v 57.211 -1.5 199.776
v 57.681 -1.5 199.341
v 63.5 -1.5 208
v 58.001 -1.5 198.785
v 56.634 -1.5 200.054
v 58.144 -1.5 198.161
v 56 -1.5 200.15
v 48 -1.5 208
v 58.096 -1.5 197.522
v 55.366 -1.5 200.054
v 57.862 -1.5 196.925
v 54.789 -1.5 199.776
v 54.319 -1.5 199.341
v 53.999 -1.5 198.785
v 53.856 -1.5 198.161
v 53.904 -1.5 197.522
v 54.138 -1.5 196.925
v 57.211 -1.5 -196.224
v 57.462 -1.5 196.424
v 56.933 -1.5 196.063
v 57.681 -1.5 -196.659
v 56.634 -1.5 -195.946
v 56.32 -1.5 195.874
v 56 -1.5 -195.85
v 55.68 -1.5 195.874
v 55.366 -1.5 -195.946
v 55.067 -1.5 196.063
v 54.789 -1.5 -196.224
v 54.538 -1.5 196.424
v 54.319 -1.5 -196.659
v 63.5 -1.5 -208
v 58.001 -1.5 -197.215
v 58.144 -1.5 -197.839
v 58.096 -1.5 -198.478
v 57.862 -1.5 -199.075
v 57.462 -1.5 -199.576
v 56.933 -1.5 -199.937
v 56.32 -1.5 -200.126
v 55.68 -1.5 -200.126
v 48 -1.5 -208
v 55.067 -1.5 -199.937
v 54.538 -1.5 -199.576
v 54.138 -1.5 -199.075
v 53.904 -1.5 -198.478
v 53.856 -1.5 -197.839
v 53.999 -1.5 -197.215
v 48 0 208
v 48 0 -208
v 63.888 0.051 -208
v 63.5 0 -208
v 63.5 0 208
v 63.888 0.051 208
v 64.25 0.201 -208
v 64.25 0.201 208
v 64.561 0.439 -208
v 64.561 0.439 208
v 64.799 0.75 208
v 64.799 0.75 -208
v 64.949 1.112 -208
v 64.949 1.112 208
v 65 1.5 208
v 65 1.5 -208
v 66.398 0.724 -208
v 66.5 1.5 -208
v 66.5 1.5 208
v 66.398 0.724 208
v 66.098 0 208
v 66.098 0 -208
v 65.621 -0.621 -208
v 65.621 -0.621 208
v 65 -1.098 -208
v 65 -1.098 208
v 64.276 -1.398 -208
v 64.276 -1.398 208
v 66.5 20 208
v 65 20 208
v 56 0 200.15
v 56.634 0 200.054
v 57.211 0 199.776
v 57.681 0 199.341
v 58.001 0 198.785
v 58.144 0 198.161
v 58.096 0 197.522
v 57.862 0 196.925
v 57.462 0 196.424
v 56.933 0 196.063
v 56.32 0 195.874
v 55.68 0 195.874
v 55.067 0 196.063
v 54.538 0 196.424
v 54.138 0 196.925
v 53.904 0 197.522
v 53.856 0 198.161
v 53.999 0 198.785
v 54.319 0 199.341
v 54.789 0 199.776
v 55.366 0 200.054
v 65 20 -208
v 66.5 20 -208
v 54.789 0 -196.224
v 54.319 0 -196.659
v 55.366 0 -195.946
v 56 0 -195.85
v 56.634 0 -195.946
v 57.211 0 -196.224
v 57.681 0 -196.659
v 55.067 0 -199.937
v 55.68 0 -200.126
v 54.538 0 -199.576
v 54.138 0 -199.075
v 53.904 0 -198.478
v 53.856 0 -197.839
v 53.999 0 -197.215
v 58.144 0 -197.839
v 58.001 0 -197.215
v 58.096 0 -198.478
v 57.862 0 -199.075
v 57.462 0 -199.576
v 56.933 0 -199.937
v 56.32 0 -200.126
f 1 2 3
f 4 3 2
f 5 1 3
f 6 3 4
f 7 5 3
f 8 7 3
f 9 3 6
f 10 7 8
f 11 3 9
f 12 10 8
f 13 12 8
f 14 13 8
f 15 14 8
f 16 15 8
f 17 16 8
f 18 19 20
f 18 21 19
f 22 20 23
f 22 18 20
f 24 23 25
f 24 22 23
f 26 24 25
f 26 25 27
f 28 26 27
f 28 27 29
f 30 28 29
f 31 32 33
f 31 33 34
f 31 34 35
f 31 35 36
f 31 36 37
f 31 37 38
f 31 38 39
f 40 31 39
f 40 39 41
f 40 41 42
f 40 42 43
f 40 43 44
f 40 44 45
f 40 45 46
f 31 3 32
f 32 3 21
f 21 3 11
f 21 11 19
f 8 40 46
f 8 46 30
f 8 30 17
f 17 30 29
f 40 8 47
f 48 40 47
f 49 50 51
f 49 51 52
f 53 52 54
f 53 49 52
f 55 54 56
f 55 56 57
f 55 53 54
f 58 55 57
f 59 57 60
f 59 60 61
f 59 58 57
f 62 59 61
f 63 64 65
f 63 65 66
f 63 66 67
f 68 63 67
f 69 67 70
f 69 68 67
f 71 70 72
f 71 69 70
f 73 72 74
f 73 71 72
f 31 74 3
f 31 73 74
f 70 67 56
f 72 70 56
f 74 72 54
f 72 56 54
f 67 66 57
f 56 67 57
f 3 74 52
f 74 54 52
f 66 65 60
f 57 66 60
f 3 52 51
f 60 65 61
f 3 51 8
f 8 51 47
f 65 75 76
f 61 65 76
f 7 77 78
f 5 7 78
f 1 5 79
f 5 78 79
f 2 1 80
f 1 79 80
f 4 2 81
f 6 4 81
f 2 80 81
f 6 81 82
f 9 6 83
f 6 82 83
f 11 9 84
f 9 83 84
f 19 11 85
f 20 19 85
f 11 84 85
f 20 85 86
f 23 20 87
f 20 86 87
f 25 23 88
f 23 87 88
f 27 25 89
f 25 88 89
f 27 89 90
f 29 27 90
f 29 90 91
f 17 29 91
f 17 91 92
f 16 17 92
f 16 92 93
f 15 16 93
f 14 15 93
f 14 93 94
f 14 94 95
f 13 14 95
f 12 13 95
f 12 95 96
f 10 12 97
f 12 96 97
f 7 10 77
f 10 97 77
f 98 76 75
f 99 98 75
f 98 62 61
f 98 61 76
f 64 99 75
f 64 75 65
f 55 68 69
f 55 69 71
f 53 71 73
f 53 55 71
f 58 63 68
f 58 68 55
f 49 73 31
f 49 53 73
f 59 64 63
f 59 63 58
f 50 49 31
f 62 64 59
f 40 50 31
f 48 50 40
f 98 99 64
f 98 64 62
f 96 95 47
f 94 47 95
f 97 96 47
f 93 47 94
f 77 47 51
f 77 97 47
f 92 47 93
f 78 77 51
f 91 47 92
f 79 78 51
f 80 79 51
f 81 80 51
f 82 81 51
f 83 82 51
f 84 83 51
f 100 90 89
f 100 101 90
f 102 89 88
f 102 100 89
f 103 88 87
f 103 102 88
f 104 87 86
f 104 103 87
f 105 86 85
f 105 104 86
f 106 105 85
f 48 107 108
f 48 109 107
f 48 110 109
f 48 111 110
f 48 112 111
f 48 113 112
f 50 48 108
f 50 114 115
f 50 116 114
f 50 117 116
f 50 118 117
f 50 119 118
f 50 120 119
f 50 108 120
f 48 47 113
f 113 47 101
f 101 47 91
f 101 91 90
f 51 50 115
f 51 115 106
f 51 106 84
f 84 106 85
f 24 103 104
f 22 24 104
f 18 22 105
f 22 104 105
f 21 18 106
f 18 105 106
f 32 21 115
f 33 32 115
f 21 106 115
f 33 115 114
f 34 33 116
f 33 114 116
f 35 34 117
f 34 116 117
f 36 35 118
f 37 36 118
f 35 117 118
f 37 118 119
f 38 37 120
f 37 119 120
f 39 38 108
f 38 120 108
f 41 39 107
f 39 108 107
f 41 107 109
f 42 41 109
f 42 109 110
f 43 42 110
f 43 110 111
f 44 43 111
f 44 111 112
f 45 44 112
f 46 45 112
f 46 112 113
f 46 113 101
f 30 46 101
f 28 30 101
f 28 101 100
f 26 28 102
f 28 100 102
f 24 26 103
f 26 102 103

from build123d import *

# Parameters (mm, degrees)
SM_GUIDE_DEPTH  = 416
SK_HOLES_R      = 2.15
CUT_HOLES_DEPTH = 1.5


# Sheet-metal steps are written as plain solids
with BuildPart() as part:
    # SK_Guide → SM_Guide (new body)
    with BuildSketch(Plane.XY.offset(-208)):
        with BuildLine():
            Line((48, 0), (63.5, 0))
            ThreePointArc((63.5, 0), (64.560660172, 0.439339828), (65, 1.5))
            Line((65, 1.5), (65, 20))
            Line((65, 20), (66.5, 20))
            Line((66.5, 20), (66.5, 1.5))
            ThreePointArc((66.5, 1.5), (65.621320344, -0.621320344), (63.5, -1.5))
            Line((63.5, -1.5), (48, -1.5))
            Line((48, -1.5), (48, 0))
        make_face()
    extrude(amount=SM_GUIDE_DEPTH)

    # SK_Holes → CUT_Holes (cut)
    with BuildSketch(Plane(origin=(0, 0, 0), x_dir=(1, 0, 0), z_dir=(0, 1, 0))):
        with Locations(Location((56, -198, 0), (0, 0, 270))):
            Circle(SK_HOLES_R)
        with Locations(Location((56, 198, 0), (0, 0, 270))):
            Circle(SK_HOLES_R)
    extrude(amount=-CUT_HOLES_DEPTH, mode=Mode.SUBTRACT)


solid = part.part
